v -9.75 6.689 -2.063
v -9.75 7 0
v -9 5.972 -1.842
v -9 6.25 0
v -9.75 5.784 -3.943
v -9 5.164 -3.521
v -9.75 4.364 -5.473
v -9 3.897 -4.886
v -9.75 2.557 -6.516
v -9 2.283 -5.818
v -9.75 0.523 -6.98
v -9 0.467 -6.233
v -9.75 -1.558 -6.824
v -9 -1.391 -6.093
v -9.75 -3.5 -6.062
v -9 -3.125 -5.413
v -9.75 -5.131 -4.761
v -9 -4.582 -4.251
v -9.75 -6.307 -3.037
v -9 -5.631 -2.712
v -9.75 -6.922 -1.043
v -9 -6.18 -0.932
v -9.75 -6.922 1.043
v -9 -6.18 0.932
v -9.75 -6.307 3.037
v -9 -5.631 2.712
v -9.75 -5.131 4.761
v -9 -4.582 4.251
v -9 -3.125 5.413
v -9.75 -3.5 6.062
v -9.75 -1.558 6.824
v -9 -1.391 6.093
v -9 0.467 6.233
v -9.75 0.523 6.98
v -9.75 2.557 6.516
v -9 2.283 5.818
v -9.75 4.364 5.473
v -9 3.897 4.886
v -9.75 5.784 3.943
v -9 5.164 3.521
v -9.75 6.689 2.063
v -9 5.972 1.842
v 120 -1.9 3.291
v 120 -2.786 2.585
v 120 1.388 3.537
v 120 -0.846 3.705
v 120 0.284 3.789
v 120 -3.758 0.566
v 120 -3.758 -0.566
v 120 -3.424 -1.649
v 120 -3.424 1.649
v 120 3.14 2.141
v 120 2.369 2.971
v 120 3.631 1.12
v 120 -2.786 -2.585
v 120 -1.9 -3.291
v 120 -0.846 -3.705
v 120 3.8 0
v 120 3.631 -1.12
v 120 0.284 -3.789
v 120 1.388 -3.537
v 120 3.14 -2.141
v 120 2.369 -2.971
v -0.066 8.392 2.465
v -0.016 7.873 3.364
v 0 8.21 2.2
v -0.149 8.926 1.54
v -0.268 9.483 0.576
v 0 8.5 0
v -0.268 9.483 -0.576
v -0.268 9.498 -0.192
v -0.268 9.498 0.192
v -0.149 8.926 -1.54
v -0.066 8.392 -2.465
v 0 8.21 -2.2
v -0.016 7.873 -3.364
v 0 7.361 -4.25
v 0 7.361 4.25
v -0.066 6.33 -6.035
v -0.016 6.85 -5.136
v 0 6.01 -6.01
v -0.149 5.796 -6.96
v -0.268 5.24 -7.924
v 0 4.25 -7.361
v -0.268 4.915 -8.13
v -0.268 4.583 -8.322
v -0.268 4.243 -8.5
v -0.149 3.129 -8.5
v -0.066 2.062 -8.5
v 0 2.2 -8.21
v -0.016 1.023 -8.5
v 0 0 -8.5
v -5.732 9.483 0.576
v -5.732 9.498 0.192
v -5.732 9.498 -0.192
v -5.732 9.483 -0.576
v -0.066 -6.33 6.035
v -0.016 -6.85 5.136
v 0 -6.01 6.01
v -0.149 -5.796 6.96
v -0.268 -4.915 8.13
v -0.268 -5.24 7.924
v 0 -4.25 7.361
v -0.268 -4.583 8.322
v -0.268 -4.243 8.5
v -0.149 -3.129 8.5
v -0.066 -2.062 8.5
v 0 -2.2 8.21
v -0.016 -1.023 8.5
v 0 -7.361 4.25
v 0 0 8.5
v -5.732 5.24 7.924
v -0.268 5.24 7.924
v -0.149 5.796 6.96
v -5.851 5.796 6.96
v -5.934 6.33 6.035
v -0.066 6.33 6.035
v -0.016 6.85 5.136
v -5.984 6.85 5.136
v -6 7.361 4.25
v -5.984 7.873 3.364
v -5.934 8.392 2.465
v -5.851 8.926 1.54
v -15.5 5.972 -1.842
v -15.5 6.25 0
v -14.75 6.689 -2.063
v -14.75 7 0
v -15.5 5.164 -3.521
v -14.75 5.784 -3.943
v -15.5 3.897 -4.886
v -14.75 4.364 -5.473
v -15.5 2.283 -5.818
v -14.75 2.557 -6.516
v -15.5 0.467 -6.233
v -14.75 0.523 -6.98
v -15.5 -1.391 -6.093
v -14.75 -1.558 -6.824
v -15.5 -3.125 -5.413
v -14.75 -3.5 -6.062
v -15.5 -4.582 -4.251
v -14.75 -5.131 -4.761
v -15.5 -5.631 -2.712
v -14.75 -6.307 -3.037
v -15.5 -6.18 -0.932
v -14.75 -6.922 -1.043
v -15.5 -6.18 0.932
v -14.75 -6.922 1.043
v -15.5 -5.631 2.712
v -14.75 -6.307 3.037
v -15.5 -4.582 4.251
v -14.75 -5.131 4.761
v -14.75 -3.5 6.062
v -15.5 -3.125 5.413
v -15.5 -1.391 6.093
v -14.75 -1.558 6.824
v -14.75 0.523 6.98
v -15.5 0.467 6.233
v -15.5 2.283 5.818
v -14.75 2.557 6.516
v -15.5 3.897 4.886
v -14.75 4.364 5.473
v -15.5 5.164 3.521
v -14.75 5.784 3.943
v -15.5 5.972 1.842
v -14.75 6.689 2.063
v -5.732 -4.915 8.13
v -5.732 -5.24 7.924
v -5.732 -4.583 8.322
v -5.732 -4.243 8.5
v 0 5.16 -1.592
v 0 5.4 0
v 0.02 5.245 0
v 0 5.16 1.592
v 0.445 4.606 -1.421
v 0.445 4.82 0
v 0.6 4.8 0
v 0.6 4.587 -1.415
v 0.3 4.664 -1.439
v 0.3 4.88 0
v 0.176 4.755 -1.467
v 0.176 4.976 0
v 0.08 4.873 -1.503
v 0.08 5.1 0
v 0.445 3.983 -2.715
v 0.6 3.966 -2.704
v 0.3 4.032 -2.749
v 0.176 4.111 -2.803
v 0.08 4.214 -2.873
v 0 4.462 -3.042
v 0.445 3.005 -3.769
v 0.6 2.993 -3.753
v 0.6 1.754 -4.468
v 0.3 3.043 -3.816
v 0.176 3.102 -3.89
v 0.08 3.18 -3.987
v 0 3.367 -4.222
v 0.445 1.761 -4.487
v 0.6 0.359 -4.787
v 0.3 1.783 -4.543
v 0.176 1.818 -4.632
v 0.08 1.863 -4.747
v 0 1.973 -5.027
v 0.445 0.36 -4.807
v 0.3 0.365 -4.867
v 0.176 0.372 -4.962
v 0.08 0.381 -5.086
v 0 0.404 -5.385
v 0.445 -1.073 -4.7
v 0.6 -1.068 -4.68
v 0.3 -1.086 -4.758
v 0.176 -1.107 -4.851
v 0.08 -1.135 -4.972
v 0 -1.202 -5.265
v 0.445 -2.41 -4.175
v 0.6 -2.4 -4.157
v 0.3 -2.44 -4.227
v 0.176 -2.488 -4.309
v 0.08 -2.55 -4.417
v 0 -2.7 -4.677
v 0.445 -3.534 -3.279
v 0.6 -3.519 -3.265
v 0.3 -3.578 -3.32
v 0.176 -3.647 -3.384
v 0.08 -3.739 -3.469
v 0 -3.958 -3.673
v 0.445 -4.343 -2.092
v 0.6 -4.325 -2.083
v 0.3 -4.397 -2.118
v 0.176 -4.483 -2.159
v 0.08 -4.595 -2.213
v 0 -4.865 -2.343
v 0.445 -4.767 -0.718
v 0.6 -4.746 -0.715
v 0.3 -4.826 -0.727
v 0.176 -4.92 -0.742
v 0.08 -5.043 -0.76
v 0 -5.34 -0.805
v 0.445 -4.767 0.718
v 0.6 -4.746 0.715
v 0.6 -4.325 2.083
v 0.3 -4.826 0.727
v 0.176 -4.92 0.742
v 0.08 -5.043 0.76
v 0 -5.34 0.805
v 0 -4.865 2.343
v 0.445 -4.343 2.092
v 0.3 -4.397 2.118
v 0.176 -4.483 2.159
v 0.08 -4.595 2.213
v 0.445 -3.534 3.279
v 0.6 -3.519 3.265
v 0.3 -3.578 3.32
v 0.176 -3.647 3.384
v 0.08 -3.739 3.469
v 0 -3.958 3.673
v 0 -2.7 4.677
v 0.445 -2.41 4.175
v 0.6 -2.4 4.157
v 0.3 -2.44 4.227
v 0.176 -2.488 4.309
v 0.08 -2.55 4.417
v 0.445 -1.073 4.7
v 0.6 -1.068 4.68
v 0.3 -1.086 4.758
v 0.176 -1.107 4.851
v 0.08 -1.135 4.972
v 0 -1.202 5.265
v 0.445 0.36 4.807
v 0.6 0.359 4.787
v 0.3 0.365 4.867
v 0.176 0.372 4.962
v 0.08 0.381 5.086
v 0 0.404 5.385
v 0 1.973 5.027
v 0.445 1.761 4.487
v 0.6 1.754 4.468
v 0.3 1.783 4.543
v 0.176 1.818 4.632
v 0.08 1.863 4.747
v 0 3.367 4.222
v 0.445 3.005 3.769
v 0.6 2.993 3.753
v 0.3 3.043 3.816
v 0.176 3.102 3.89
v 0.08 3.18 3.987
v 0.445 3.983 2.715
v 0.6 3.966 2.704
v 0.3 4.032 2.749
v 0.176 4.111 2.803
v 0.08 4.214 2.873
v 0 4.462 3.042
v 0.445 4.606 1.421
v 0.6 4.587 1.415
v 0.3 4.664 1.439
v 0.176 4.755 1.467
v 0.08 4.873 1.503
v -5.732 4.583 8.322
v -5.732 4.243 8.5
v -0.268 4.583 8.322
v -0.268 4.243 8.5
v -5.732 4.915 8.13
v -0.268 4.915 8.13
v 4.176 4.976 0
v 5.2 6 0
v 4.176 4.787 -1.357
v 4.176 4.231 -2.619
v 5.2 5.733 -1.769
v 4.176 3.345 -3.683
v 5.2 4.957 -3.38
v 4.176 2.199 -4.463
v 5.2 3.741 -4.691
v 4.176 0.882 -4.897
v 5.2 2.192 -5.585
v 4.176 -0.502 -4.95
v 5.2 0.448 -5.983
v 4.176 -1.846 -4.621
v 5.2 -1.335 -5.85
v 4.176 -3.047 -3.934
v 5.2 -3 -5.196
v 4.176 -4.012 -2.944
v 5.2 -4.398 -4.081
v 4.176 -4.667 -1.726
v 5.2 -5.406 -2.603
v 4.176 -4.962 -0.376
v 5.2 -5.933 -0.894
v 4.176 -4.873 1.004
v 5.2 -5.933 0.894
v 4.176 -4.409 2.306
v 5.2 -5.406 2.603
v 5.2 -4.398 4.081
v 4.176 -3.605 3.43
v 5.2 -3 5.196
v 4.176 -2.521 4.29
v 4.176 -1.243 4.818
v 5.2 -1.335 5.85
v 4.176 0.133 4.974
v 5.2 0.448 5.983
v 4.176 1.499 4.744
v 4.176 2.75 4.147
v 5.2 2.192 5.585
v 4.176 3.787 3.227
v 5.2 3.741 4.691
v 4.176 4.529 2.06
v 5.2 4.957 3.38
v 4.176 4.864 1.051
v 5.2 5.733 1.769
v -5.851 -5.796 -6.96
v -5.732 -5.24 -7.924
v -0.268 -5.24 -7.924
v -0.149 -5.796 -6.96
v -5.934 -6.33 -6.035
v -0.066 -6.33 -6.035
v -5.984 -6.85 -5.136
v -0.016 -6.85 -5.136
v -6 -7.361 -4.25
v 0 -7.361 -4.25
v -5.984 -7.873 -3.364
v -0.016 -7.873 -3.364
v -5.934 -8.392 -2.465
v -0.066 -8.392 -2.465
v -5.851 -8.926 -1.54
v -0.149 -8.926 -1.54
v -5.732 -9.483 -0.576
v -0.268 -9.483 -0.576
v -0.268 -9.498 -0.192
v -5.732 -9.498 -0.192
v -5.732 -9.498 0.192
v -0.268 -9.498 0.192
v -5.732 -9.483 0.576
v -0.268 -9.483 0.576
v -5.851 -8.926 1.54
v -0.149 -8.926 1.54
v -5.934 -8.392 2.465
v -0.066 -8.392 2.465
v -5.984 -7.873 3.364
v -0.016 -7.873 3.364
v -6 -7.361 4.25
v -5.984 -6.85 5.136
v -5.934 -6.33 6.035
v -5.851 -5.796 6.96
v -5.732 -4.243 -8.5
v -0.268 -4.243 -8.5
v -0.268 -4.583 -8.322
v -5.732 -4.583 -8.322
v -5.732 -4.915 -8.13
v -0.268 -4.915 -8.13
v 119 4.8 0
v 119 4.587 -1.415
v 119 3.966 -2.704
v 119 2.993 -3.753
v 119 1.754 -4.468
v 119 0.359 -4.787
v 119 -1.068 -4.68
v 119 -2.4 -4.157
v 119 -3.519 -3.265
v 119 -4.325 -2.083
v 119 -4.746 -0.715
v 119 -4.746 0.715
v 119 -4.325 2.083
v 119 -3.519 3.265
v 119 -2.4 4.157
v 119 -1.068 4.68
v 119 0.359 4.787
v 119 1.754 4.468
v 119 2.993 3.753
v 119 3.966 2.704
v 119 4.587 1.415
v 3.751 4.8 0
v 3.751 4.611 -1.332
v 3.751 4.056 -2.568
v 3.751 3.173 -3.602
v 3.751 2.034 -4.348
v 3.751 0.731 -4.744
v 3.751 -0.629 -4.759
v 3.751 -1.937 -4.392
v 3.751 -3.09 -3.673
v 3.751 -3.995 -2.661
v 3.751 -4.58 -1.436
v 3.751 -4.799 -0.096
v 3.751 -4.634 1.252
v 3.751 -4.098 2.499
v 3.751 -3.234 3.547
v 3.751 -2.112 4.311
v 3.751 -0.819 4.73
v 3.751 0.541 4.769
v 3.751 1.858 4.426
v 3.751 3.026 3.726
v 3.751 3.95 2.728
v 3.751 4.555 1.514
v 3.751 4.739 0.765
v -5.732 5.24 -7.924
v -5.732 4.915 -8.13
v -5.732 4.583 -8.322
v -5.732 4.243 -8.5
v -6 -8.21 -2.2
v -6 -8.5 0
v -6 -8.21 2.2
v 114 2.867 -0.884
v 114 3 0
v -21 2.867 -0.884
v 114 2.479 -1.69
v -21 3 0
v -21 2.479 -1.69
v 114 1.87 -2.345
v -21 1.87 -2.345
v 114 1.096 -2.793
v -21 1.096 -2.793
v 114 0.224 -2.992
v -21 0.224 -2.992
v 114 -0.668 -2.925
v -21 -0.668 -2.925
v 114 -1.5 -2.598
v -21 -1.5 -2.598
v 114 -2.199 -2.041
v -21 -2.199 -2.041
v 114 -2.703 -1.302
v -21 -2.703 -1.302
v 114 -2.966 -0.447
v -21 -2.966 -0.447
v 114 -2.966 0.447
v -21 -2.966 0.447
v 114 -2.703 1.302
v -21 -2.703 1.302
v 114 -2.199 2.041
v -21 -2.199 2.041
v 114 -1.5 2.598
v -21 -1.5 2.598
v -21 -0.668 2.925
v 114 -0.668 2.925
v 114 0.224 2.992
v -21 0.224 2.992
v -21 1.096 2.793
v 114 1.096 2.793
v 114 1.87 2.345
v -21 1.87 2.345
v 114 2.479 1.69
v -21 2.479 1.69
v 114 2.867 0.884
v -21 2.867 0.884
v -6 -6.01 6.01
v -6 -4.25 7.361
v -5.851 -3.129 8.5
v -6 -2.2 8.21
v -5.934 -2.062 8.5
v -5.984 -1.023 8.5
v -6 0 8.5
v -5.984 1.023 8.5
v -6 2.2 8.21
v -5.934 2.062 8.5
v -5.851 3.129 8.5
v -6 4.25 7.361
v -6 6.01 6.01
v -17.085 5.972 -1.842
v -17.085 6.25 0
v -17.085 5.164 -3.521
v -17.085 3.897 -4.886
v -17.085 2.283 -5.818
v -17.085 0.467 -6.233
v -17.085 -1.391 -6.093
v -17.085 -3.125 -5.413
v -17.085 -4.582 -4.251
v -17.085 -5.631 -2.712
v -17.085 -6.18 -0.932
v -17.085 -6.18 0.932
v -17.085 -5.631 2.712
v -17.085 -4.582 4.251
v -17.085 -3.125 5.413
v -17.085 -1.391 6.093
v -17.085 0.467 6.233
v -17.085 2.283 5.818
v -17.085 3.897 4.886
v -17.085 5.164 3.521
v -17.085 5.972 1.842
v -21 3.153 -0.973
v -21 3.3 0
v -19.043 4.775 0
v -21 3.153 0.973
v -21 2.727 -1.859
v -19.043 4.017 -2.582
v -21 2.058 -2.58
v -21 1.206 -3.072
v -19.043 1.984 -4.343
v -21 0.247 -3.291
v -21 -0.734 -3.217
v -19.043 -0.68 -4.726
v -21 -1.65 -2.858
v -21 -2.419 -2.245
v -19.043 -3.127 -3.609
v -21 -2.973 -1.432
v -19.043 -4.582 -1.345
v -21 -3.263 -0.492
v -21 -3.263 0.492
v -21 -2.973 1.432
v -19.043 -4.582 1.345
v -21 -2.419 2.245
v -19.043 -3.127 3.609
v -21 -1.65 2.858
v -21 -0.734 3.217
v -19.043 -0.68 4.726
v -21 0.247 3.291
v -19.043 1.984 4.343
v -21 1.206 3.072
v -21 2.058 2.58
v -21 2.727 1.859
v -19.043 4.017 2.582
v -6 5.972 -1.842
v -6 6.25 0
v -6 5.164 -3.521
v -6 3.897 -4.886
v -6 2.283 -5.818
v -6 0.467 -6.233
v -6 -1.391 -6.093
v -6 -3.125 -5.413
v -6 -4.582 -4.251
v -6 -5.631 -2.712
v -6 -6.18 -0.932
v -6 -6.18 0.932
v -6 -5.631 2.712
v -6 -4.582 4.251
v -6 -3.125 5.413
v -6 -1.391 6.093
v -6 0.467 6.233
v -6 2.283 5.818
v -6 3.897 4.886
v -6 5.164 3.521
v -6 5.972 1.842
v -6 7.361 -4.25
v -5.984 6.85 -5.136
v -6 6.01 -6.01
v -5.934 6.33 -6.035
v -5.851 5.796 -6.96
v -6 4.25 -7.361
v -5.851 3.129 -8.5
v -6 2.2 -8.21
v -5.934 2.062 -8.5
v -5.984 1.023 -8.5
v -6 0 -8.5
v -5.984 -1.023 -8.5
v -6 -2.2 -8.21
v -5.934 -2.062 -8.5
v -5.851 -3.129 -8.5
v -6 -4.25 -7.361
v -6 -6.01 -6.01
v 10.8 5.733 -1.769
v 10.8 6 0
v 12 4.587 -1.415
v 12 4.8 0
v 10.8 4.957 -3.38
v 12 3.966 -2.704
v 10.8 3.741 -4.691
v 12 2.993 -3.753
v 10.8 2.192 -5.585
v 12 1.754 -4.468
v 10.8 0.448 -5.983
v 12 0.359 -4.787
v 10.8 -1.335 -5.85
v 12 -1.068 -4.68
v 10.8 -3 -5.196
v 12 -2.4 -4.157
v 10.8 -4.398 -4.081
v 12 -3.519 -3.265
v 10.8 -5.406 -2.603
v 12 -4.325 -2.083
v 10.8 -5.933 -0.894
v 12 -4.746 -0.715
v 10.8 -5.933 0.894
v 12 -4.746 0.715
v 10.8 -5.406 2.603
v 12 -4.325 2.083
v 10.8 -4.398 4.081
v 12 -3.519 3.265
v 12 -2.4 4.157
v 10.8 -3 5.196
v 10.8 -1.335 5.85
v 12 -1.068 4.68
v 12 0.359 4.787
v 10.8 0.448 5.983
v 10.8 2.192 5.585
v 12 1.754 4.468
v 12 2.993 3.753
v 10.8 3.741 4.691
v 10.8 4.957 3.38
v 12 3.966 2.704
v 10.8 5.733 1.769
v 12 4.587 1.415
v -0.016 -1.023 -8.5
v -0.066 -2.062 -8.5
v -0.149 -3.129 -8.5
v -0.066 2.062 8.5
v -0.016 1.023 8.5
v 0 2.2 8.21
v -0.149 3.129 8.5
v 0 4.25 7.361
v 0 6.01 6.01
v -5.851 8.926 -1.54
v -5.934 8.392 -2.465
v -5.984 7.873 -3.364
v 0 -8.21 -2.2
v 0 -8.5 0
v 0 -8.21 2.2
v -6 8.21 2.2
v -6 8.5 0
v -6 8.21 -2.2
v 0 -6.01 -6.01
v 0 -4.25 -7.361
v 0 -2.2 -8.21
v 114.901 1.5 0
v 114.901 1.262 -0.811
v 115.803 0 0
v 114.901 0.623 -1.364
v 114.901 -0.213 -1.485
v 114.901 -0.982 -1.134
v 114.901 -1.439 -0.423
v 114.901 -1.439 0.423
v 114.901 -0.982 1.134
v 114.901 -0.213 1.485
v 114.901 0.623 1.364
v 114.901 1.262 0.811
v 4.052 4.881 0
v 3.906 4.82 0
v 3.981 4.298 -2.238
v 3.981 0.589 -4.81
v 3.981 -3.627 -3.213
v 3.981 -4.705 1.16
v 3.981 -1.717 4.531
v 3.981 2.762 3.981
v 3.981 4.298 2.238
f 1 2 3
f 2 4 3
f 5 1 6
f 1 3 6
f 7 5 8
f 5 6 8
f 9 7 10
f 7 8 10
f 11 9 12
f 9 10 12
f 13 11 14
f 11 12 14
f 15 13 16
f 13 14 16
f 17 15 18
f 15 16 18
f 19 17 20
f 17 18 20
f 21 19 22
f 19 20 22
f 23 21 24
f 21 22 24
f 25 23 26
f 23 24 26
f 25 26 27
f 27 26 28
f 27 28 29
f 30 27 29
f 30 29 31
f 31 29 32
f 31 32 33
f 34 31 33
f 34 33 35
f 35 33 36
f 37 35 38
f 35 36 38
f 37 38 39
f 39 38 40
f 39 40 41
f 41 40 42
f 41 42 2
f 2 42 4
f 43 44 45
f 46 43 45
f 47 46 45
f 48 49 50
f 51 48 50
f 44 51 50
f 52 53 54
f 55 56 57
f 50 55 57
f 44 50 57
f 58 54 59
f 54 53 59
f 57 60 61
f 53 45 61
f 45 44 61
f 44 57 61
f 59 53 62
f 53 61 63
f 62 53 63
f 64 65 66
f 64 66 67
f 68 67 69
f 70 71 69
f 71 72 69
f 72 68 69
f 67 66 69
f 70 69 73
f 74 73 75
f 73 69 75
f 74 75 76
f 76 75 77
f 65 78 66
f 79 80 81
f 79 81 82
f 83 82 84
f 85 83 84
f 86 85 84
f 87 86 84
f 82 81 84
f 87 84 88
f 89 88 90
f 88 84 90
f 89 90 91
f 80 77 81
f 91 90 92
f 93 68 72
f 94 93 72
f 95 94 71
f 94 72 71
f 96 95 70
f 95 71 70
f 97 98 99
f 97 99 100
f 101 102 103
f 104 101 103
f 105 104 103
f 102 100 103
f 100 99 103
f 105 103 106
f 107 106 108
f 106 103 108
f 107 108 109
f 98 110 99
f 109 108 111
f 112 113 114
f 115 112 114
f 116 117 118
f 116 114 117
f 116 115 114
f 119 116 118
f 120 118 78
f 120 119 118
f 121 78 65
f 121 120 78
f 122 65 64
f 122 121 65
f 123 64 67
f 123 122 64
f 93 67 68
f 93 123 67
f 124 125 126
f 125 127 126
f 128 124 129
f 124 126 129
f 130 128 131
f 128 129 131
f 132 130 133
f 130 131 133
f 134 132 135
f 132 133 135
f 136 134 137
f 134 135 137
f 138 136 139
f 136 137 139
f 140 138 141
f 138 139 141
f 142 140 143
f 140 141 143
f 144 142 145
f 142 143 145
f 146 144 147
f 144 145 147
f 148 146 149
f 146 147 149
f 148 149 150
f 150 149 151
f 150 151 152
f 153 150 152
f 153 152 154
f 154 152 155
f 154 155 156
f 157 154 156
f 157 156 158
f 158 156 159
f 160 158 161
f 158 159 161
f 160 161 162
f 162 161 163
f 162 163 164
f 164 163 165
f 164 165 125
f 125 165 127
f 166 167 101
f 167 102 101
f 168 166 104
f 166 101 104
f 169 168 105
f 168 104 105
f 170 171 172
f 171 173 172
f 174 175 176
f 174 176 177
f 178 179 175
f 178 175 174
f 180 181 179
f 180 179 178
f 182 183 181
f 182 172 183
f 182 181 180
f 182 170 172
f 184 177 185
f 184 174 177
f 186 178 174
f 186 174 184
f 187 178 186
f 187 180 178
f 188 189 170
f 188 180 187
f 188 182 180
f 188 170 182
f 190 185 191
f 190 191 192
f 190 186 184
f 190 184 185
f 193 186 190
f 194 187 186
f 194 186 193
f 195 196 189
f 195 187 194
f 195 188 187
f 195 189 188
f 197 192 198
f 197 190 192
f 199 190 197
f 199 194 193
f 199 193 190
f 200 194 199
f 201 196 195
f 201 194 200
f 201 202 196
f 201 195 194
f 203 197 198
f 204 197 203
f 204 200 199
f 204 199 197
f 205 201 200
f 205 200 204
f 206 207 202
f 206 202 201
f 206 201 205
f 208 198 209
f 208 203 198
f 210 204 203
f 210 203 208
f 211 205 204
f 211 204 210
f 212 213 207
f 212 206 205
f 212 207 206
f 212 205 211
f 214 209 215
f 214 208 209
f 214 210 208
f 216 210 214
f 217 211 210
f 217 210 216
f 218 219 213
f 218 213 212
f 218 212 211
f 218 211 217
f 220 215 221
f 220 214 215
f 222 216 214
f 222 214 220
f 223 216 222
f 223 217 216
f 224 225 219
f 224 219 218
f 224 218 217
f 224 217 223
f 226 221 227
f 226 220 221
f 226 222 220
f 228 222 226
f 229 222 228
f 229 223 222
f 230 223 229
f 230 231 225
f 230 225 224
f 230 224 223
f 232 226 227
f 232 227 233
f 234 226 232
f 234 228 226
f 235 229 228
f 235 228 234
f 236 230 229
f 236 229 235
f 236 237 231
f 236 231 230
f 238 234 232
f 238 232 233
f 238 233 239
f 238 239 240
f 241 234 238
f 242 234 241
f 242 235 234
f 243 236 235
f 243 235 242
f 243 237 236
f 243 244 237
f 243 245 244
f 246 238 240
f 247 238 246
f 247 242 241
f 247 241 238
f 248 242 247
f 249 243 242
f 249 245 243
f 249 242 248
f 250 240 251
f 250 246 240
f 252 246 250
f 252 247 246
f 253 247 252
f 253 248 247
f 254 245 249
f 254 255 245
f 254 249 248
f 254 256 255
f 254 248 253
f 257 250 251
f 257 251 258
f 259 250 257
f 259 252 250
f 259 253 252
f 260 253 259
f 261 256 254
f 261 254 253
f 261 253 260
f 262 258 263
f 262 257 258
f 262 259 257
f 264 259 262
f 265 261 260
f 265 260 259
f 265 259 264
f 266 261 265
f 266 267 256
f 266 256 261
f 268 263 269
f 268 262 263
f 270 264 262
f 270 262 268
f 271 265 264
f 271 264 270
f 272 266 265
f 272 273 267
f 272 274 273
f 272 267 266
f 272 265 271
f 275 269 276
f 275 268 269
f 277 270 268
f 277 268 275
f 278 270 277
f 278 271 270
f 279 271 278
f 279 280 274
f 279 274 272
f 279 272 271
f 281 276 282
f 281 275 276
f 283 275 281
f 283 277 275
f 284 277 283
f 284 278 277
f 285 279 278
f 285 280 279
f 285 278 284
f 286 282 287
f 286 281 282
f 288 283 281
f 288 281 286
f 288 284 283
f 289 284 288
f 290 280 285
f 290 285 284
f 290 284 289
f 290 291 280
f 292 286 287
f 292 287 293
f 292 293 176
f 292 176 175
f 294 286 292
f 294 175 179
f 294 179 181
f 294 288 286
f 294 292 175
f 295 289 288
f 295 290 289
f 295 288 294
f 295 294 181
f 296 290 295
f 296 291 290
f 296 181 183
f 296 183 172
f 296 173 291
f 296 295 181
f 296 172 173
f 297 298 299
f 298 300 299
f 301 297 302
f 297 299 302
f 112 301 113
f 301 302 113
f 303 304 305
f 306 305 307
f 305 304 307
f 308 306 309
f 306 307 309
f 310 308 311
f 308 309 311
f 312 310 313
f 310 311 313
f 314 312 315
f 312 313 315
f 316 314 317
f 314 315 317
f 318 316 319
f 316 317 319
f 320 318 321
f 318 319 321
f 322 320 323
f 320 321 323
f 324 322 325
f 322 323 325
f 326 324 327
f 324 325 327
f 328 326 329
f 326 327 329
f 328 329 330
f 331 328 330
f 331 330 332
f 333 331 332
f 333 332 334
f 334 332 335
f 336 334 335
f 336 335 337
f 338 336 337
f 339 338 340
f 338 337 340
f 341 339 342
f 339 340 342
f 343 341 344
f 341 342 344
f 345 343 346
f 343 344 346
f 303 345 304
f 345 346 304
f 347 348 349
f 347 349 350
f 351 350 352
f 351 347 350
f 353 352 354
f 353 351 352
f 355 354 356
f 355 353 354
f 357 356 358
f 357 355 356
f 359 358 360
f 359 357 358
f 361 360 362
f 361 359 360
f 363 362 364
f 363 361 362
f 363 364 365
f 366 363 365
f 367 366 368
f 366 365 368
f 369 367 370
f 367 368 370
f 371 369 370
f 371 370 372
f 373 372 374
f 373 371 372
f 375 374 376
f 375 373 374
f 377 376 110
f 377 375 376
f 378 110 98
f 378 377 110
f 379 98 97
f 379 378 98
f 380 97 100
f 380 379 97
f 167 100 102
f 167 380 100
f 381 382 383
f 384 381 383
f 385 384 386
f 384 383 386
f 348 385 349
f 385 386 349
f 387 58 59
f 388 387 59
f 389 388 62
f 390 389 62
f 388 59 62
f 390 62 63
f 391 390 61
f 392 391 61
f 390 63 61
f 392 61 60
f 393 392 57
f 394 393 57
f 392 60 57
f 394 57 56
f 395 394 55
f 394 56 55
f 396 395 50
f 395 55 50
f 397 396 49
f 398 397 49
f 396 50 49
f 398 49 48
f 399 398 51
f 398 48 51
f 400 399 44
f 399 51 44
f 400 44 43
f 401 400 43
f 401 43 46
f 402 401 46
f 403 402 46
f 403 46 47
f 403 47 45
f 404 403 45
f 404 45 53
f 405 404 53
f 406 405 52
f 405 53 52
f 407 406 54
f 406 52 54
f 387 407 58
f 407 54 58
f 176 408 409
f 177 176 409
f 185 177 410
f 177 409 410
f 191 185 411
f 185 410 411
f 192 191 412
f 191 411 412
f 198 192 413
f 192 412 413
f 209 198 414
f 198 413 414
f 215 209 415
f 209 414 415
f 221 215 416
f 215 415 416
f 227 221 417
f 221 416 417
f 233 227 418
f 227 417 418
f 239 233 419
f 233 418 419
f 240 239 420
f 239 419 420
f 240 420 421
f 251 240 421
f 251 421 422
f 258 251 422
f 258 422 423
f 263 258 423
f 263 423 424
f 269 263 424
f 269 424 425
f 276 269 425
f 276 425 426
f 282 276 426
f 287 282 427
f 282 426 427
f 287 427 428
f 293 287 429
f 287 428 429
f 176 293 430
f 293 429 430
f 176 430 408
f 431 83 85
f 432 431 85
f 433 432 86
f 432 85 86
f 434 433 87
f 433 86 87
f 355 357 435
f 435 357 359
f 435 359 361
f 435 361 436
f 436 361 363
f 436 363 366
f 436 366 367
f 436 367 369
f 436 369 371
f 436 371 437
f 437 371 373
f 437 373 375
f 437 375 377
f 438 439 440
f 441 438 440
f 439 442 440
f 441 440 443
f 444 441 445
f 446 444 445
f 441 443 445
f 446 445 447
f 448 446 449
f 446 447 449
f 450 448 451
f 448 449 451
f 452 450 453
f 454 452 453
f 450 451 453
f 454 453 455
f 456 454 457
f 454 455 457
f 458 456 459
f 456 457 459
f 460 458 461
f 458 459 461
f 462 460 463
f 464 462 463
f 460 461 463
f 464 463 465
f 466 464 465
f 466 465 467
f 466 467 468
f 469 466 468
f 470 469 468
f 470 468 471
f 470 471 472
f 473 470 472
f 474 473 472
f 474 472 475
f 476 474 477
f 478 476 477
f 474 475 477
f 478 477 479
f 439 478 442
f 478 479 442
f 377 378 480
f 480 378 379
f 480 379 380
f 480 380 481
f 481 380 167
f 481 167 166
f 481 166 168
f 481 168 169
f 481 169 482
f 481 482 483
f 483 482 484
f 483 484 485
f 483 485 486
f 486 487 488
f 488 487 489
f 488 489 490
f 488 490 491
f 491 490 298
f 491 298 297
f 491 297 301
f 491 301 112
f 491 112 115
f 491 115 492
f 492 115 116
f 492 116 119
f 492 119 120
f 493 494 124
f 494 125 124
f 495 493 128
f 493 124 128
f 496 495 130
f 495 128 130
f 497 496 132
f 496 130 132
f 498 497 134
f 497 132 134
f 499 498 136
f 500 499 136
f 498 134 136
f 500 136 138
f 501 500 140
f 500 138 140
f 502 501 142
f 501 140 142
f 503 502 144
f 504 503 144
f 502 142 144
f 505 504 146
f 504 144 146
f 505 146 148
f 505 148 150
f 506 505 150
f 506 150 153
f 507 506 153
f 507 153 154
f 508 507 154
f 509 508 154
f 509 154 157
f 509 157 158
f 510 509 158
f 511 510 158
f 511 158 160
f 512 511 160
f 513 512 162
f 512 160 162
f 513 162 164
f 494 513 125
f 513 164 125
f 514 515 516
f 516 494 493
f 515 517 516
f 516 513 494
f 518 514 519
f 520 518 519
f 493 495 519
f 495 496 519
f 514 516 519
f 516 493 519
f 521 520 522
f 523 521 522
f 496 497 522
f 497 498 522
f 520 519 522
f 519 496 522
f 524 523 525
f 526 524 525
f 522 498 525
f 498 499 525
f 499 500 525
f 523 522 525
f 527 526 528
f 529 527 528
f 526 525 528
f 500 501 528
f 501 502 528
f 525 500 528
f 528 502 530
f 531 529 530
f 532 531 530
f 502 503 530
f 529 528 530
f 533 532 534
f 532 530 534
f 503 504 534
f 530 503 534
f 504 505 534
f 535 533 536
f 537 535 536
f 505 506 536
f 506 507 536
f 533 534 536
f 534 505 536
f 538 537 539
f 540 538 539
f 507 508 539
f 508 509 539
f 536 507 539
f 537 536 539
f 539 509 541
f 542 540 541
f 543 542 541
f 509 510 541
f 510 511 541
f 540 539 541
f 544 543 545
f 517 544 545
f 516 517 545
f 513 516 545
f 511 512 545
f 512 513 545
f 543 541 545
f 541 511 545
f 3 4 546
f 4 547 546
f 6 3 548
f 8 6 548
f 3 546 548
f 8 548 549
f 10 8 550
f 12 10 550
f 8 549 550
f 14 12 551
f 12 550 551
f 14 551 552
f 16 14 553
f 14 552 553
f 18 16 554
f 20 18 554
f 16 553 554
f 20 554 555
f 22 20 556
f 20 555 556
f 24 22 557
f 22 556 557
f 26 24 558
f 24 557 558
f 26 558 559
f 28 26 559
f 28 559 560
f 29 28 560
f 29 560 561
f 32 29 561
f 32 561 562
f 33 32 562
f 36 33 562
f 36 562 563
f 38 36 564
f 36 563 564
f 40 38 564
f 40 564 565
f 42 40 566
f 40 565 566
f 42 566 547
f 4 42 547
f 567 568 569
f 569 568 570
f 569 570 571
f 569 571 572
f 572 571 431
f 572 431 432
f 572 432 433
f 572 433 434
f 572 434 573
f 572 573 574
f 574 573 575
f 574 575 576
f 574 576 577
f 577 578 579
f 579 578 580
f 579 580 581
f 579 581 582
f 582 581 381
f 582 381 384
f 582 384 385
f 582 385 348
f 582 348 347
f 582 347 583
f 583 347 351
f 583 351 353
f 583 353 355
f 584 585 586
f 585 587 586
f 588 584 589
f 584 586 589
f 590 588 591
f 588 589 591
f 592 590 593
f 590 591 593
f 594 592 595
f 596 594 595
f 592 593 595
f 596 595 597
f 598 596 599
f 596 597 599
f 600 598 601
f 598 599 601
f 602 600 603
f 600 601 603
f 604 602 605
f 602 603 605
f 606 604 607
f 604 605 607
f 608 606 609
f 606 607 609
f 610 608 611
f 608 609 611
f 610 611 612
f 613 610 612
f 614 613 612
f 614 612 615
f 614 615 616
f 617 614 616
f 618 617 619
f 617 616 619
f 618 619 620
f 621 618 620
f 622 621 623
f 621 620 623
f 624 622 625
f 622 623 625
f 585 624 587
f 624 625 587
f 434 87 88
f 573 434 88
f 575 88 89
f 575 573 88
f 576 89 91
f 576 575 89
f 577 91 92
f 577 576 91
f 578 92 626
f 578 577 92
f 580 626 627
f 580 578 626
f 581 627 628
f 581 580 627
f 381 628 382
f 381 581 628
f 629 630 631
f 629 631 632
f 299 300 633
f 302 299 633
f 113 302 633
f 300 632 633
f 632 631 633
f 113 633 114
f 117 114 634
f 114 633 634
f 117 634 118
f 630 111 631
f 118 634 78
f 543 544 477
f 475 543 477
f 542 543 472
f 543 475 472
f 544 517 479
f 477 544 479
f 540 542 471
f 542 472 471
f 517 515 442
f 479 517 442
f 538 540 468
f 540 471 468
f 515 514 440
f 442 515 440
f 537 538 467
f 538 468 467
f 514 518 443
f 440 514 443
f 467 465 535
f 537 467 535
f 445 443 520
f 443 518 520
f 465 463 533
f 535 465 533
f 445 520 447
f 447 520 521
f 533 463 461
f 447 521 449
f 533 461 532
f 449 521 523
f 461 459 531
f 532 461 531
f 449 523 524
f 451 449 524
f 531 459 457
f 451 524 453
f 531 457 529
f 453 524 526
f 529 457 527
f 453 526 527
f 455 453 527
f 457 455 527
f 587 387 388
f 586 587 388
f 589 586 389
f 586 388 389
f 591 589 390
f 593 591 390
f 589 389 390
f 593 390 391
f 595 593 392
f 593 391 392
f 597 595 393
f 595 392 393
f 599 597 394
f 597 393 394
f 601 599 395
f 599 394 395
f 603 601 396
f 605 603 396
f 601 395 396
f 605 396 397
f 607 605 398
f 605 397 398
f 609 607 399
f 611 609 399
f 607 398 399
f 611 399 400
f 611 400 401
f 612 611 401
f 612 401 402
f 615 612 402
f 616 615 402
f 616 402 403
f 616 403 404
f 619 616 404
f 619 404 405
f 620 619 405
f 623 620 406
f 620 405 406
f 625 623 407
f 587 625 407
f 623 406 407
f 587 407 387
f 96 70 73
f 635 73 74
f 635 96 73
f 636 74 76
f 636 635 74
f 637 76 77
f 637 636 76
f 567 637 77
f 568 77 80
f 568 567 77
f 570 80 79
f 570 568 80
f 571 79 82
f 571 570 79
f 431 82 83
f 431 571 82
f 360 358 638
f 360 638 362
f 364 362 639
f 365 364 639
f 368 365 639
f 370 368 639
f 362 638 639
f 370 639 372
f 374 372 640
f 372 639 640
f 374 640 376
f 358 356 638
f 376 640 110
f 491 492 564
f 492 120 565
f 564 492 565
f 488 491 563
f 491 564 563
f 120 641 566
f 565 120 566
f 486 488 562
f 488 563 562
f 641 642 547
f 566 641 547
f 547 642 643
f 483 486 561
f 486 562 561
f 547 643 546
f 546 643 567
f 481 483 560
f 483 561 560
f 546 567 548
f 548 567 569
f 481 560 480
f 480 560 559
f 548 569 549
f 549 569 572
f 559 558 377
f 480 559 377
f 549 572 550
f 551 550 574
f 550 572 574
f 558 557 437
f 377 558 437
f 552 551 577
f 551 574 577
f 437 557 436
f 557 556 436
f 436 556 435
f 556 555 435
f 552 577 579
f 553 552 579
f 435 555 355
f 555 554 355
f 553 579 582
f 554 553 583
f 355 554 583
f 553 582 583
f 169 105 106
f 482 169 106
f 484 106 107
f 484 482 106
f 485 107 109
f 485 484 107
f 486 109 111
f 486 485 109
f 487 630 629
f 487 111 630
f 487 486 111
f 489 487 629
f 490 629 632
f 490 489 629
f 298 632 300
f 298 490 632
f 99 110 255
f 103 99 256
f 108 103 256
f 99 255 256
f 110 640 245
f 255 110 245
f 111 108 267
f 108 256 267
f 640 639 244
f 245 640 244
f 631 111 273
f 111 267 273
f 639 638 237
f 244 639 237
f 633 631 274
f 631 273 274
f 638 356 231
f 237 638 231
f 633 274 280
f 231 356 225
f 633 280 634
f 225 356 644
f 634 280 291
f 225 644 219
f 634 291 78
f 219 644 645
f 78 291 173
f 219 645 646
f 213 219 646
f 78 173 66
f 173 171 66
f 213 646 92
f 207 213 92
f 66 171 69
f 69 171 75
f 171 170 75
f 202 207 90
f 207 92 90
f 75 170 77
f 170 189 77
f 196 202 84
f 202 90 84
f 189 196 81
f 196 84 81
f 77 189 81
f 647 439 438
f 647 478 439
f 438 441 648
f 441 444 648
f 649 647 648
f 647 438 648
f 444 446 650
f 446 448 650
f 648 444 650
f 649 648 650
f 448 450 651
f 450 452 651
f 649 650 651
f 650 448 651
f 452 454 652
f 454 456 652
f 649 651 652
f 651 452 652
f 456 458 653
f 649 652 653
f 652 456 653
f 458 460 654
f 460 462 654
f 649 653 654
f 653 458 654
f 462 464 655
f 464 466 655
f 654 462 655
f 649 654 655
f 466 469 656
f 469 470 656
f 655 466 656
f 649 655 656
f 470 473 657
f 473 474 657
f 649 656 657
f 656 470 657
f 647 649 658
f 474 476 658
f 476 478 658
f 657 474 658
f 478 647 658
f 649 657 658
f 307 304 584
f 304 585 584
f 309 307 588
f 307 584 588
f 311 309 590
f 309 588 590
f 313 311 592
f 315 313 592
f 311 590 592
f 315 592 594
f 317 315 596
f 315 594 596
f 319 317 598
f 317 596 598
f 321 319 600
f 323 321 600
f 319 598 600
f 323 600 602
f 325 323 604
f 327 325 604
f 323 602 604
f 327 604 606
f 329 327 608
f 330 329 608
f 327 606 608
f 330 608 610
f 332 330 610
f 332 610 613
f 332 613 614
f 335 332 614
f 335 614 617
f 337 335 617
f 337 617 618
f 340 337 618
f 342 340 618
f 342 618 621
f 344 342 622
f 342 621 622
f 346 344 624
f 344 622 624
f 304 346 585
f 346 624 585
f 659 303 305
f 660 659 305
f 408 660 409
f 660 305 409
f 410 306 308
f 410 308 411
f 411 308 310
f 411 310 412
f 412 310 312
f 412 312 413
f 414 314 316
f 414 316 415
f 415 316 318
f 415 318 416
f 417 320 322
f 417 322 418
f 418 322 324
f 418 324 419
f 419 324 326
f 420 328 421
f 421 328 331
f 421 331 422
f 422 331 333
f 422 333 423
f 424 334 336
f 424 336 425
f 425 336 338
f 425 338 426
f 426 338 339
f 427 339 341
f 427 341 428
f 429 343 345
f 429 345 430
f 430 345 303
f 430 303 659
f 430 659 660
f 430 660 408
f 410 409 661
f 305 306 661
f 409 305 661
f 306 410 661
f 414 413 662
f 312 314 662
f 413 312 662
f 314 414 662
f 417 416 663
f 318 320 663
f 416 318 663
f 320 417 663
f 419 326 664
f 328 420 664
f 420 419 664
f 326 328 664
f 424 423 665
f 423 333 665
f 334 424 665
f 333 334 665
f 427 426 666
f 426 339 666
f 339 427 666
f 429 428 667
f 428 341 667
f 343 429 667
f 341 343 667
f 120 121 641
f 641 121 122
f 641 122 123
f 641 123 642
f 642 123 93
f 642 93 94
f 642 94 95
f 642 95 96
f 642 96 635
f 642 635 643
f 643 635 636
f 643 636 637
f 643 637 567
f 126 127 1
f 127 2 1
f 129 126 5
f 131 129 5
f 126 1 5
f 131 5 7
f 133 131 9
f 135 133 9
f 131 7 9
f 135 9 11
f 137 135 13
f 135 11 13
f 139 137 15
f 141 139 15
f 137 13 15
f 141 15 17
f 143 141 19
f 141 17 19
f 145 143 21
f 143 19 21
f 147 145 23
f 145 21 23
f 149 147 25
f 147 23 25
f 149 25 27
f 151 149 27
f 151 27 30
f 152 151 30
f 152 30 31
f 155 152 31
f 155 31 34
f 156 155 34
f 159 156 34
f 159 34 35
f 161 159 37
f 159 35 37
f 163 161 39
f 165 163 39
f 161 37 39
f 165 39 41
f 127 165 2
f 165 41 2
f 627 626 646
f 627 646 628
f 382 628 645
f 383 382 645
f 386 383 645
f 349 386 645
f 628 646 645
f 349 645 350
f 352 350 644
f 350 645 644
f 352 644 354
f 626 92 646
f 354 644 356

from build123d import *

# Parameters (mm, degrees)
SKETCH_2_OUTSIDE_W  = 49.708
SKETCH_2_OUTSIDE_H  = 49.708
CUT_EXTRUDE_1_DEPTH = 127
CHAMFER_1_SIZE      = 1
FILLET_1_R          = 0.6


with BuildPart() as part:
    # Эскиз1 → Повернуть1 (revolve)
    with BuildSketch(Plane.XY):
        Polygon((0, 8.5), (0, 4.8), (4, 4.8), (5.2, 6), (10.8, 6), (12, 4.8), (120, 4.8), (120, 0), (115.802581857, 0), (114, 3), (-21, 3), (-21, 3.3), (-17.085217776, 6.25), (-15.5, 6.25), (-14.75, 7), (-9.75, 7), (-9, 6.25), (-6, 6.25), (-6, 8.5), (-5.732050808, 9.5), (-0.267949192, 9.5), align=None)
    revolve(axis=Axis((0, 0, 0), (-1, 0, 0)))

    # Эскиз2 outside → Вырез-Вытянуть1 (cut, through all)
    with BuildSketch(Plane.ZY.offset(6)):
        Rectangle(SKETCH_2_OUTSIDE_W, SKETCH_2_OUTSIDE_H)
        Polygon((0, 9.814954576), (-8.5, 4.907477288), (-8.5, -4.907477288), (0, -9.814954576), (8.5, -4.907477288), (8.5, 4.907477288), align=None, mode=Mode.SUBTRACT)
    extrude(amount=-CUT_EXTRUDE_1_DEPTH, mode=Mode.SUBTRACT)

    # Фаска1
    chamfer_1_edges = [part.edges().sort_by_distance(p)[0] for p in [
        (120, -4.8, 0),
    ]]
    chamfer(chamfer_1_edges, length=CHAMFER_1_SIZE)

    # Скругление1
    fillet_1_edges = [part.edges().sort_by_distance(p)[0] for p in [
        (4, -4.8, 0),
        (0, -4.8, 0),
    ]]
    fillet(fillet_1_edges, radius=FILLET_1_R)


solid = part.part
